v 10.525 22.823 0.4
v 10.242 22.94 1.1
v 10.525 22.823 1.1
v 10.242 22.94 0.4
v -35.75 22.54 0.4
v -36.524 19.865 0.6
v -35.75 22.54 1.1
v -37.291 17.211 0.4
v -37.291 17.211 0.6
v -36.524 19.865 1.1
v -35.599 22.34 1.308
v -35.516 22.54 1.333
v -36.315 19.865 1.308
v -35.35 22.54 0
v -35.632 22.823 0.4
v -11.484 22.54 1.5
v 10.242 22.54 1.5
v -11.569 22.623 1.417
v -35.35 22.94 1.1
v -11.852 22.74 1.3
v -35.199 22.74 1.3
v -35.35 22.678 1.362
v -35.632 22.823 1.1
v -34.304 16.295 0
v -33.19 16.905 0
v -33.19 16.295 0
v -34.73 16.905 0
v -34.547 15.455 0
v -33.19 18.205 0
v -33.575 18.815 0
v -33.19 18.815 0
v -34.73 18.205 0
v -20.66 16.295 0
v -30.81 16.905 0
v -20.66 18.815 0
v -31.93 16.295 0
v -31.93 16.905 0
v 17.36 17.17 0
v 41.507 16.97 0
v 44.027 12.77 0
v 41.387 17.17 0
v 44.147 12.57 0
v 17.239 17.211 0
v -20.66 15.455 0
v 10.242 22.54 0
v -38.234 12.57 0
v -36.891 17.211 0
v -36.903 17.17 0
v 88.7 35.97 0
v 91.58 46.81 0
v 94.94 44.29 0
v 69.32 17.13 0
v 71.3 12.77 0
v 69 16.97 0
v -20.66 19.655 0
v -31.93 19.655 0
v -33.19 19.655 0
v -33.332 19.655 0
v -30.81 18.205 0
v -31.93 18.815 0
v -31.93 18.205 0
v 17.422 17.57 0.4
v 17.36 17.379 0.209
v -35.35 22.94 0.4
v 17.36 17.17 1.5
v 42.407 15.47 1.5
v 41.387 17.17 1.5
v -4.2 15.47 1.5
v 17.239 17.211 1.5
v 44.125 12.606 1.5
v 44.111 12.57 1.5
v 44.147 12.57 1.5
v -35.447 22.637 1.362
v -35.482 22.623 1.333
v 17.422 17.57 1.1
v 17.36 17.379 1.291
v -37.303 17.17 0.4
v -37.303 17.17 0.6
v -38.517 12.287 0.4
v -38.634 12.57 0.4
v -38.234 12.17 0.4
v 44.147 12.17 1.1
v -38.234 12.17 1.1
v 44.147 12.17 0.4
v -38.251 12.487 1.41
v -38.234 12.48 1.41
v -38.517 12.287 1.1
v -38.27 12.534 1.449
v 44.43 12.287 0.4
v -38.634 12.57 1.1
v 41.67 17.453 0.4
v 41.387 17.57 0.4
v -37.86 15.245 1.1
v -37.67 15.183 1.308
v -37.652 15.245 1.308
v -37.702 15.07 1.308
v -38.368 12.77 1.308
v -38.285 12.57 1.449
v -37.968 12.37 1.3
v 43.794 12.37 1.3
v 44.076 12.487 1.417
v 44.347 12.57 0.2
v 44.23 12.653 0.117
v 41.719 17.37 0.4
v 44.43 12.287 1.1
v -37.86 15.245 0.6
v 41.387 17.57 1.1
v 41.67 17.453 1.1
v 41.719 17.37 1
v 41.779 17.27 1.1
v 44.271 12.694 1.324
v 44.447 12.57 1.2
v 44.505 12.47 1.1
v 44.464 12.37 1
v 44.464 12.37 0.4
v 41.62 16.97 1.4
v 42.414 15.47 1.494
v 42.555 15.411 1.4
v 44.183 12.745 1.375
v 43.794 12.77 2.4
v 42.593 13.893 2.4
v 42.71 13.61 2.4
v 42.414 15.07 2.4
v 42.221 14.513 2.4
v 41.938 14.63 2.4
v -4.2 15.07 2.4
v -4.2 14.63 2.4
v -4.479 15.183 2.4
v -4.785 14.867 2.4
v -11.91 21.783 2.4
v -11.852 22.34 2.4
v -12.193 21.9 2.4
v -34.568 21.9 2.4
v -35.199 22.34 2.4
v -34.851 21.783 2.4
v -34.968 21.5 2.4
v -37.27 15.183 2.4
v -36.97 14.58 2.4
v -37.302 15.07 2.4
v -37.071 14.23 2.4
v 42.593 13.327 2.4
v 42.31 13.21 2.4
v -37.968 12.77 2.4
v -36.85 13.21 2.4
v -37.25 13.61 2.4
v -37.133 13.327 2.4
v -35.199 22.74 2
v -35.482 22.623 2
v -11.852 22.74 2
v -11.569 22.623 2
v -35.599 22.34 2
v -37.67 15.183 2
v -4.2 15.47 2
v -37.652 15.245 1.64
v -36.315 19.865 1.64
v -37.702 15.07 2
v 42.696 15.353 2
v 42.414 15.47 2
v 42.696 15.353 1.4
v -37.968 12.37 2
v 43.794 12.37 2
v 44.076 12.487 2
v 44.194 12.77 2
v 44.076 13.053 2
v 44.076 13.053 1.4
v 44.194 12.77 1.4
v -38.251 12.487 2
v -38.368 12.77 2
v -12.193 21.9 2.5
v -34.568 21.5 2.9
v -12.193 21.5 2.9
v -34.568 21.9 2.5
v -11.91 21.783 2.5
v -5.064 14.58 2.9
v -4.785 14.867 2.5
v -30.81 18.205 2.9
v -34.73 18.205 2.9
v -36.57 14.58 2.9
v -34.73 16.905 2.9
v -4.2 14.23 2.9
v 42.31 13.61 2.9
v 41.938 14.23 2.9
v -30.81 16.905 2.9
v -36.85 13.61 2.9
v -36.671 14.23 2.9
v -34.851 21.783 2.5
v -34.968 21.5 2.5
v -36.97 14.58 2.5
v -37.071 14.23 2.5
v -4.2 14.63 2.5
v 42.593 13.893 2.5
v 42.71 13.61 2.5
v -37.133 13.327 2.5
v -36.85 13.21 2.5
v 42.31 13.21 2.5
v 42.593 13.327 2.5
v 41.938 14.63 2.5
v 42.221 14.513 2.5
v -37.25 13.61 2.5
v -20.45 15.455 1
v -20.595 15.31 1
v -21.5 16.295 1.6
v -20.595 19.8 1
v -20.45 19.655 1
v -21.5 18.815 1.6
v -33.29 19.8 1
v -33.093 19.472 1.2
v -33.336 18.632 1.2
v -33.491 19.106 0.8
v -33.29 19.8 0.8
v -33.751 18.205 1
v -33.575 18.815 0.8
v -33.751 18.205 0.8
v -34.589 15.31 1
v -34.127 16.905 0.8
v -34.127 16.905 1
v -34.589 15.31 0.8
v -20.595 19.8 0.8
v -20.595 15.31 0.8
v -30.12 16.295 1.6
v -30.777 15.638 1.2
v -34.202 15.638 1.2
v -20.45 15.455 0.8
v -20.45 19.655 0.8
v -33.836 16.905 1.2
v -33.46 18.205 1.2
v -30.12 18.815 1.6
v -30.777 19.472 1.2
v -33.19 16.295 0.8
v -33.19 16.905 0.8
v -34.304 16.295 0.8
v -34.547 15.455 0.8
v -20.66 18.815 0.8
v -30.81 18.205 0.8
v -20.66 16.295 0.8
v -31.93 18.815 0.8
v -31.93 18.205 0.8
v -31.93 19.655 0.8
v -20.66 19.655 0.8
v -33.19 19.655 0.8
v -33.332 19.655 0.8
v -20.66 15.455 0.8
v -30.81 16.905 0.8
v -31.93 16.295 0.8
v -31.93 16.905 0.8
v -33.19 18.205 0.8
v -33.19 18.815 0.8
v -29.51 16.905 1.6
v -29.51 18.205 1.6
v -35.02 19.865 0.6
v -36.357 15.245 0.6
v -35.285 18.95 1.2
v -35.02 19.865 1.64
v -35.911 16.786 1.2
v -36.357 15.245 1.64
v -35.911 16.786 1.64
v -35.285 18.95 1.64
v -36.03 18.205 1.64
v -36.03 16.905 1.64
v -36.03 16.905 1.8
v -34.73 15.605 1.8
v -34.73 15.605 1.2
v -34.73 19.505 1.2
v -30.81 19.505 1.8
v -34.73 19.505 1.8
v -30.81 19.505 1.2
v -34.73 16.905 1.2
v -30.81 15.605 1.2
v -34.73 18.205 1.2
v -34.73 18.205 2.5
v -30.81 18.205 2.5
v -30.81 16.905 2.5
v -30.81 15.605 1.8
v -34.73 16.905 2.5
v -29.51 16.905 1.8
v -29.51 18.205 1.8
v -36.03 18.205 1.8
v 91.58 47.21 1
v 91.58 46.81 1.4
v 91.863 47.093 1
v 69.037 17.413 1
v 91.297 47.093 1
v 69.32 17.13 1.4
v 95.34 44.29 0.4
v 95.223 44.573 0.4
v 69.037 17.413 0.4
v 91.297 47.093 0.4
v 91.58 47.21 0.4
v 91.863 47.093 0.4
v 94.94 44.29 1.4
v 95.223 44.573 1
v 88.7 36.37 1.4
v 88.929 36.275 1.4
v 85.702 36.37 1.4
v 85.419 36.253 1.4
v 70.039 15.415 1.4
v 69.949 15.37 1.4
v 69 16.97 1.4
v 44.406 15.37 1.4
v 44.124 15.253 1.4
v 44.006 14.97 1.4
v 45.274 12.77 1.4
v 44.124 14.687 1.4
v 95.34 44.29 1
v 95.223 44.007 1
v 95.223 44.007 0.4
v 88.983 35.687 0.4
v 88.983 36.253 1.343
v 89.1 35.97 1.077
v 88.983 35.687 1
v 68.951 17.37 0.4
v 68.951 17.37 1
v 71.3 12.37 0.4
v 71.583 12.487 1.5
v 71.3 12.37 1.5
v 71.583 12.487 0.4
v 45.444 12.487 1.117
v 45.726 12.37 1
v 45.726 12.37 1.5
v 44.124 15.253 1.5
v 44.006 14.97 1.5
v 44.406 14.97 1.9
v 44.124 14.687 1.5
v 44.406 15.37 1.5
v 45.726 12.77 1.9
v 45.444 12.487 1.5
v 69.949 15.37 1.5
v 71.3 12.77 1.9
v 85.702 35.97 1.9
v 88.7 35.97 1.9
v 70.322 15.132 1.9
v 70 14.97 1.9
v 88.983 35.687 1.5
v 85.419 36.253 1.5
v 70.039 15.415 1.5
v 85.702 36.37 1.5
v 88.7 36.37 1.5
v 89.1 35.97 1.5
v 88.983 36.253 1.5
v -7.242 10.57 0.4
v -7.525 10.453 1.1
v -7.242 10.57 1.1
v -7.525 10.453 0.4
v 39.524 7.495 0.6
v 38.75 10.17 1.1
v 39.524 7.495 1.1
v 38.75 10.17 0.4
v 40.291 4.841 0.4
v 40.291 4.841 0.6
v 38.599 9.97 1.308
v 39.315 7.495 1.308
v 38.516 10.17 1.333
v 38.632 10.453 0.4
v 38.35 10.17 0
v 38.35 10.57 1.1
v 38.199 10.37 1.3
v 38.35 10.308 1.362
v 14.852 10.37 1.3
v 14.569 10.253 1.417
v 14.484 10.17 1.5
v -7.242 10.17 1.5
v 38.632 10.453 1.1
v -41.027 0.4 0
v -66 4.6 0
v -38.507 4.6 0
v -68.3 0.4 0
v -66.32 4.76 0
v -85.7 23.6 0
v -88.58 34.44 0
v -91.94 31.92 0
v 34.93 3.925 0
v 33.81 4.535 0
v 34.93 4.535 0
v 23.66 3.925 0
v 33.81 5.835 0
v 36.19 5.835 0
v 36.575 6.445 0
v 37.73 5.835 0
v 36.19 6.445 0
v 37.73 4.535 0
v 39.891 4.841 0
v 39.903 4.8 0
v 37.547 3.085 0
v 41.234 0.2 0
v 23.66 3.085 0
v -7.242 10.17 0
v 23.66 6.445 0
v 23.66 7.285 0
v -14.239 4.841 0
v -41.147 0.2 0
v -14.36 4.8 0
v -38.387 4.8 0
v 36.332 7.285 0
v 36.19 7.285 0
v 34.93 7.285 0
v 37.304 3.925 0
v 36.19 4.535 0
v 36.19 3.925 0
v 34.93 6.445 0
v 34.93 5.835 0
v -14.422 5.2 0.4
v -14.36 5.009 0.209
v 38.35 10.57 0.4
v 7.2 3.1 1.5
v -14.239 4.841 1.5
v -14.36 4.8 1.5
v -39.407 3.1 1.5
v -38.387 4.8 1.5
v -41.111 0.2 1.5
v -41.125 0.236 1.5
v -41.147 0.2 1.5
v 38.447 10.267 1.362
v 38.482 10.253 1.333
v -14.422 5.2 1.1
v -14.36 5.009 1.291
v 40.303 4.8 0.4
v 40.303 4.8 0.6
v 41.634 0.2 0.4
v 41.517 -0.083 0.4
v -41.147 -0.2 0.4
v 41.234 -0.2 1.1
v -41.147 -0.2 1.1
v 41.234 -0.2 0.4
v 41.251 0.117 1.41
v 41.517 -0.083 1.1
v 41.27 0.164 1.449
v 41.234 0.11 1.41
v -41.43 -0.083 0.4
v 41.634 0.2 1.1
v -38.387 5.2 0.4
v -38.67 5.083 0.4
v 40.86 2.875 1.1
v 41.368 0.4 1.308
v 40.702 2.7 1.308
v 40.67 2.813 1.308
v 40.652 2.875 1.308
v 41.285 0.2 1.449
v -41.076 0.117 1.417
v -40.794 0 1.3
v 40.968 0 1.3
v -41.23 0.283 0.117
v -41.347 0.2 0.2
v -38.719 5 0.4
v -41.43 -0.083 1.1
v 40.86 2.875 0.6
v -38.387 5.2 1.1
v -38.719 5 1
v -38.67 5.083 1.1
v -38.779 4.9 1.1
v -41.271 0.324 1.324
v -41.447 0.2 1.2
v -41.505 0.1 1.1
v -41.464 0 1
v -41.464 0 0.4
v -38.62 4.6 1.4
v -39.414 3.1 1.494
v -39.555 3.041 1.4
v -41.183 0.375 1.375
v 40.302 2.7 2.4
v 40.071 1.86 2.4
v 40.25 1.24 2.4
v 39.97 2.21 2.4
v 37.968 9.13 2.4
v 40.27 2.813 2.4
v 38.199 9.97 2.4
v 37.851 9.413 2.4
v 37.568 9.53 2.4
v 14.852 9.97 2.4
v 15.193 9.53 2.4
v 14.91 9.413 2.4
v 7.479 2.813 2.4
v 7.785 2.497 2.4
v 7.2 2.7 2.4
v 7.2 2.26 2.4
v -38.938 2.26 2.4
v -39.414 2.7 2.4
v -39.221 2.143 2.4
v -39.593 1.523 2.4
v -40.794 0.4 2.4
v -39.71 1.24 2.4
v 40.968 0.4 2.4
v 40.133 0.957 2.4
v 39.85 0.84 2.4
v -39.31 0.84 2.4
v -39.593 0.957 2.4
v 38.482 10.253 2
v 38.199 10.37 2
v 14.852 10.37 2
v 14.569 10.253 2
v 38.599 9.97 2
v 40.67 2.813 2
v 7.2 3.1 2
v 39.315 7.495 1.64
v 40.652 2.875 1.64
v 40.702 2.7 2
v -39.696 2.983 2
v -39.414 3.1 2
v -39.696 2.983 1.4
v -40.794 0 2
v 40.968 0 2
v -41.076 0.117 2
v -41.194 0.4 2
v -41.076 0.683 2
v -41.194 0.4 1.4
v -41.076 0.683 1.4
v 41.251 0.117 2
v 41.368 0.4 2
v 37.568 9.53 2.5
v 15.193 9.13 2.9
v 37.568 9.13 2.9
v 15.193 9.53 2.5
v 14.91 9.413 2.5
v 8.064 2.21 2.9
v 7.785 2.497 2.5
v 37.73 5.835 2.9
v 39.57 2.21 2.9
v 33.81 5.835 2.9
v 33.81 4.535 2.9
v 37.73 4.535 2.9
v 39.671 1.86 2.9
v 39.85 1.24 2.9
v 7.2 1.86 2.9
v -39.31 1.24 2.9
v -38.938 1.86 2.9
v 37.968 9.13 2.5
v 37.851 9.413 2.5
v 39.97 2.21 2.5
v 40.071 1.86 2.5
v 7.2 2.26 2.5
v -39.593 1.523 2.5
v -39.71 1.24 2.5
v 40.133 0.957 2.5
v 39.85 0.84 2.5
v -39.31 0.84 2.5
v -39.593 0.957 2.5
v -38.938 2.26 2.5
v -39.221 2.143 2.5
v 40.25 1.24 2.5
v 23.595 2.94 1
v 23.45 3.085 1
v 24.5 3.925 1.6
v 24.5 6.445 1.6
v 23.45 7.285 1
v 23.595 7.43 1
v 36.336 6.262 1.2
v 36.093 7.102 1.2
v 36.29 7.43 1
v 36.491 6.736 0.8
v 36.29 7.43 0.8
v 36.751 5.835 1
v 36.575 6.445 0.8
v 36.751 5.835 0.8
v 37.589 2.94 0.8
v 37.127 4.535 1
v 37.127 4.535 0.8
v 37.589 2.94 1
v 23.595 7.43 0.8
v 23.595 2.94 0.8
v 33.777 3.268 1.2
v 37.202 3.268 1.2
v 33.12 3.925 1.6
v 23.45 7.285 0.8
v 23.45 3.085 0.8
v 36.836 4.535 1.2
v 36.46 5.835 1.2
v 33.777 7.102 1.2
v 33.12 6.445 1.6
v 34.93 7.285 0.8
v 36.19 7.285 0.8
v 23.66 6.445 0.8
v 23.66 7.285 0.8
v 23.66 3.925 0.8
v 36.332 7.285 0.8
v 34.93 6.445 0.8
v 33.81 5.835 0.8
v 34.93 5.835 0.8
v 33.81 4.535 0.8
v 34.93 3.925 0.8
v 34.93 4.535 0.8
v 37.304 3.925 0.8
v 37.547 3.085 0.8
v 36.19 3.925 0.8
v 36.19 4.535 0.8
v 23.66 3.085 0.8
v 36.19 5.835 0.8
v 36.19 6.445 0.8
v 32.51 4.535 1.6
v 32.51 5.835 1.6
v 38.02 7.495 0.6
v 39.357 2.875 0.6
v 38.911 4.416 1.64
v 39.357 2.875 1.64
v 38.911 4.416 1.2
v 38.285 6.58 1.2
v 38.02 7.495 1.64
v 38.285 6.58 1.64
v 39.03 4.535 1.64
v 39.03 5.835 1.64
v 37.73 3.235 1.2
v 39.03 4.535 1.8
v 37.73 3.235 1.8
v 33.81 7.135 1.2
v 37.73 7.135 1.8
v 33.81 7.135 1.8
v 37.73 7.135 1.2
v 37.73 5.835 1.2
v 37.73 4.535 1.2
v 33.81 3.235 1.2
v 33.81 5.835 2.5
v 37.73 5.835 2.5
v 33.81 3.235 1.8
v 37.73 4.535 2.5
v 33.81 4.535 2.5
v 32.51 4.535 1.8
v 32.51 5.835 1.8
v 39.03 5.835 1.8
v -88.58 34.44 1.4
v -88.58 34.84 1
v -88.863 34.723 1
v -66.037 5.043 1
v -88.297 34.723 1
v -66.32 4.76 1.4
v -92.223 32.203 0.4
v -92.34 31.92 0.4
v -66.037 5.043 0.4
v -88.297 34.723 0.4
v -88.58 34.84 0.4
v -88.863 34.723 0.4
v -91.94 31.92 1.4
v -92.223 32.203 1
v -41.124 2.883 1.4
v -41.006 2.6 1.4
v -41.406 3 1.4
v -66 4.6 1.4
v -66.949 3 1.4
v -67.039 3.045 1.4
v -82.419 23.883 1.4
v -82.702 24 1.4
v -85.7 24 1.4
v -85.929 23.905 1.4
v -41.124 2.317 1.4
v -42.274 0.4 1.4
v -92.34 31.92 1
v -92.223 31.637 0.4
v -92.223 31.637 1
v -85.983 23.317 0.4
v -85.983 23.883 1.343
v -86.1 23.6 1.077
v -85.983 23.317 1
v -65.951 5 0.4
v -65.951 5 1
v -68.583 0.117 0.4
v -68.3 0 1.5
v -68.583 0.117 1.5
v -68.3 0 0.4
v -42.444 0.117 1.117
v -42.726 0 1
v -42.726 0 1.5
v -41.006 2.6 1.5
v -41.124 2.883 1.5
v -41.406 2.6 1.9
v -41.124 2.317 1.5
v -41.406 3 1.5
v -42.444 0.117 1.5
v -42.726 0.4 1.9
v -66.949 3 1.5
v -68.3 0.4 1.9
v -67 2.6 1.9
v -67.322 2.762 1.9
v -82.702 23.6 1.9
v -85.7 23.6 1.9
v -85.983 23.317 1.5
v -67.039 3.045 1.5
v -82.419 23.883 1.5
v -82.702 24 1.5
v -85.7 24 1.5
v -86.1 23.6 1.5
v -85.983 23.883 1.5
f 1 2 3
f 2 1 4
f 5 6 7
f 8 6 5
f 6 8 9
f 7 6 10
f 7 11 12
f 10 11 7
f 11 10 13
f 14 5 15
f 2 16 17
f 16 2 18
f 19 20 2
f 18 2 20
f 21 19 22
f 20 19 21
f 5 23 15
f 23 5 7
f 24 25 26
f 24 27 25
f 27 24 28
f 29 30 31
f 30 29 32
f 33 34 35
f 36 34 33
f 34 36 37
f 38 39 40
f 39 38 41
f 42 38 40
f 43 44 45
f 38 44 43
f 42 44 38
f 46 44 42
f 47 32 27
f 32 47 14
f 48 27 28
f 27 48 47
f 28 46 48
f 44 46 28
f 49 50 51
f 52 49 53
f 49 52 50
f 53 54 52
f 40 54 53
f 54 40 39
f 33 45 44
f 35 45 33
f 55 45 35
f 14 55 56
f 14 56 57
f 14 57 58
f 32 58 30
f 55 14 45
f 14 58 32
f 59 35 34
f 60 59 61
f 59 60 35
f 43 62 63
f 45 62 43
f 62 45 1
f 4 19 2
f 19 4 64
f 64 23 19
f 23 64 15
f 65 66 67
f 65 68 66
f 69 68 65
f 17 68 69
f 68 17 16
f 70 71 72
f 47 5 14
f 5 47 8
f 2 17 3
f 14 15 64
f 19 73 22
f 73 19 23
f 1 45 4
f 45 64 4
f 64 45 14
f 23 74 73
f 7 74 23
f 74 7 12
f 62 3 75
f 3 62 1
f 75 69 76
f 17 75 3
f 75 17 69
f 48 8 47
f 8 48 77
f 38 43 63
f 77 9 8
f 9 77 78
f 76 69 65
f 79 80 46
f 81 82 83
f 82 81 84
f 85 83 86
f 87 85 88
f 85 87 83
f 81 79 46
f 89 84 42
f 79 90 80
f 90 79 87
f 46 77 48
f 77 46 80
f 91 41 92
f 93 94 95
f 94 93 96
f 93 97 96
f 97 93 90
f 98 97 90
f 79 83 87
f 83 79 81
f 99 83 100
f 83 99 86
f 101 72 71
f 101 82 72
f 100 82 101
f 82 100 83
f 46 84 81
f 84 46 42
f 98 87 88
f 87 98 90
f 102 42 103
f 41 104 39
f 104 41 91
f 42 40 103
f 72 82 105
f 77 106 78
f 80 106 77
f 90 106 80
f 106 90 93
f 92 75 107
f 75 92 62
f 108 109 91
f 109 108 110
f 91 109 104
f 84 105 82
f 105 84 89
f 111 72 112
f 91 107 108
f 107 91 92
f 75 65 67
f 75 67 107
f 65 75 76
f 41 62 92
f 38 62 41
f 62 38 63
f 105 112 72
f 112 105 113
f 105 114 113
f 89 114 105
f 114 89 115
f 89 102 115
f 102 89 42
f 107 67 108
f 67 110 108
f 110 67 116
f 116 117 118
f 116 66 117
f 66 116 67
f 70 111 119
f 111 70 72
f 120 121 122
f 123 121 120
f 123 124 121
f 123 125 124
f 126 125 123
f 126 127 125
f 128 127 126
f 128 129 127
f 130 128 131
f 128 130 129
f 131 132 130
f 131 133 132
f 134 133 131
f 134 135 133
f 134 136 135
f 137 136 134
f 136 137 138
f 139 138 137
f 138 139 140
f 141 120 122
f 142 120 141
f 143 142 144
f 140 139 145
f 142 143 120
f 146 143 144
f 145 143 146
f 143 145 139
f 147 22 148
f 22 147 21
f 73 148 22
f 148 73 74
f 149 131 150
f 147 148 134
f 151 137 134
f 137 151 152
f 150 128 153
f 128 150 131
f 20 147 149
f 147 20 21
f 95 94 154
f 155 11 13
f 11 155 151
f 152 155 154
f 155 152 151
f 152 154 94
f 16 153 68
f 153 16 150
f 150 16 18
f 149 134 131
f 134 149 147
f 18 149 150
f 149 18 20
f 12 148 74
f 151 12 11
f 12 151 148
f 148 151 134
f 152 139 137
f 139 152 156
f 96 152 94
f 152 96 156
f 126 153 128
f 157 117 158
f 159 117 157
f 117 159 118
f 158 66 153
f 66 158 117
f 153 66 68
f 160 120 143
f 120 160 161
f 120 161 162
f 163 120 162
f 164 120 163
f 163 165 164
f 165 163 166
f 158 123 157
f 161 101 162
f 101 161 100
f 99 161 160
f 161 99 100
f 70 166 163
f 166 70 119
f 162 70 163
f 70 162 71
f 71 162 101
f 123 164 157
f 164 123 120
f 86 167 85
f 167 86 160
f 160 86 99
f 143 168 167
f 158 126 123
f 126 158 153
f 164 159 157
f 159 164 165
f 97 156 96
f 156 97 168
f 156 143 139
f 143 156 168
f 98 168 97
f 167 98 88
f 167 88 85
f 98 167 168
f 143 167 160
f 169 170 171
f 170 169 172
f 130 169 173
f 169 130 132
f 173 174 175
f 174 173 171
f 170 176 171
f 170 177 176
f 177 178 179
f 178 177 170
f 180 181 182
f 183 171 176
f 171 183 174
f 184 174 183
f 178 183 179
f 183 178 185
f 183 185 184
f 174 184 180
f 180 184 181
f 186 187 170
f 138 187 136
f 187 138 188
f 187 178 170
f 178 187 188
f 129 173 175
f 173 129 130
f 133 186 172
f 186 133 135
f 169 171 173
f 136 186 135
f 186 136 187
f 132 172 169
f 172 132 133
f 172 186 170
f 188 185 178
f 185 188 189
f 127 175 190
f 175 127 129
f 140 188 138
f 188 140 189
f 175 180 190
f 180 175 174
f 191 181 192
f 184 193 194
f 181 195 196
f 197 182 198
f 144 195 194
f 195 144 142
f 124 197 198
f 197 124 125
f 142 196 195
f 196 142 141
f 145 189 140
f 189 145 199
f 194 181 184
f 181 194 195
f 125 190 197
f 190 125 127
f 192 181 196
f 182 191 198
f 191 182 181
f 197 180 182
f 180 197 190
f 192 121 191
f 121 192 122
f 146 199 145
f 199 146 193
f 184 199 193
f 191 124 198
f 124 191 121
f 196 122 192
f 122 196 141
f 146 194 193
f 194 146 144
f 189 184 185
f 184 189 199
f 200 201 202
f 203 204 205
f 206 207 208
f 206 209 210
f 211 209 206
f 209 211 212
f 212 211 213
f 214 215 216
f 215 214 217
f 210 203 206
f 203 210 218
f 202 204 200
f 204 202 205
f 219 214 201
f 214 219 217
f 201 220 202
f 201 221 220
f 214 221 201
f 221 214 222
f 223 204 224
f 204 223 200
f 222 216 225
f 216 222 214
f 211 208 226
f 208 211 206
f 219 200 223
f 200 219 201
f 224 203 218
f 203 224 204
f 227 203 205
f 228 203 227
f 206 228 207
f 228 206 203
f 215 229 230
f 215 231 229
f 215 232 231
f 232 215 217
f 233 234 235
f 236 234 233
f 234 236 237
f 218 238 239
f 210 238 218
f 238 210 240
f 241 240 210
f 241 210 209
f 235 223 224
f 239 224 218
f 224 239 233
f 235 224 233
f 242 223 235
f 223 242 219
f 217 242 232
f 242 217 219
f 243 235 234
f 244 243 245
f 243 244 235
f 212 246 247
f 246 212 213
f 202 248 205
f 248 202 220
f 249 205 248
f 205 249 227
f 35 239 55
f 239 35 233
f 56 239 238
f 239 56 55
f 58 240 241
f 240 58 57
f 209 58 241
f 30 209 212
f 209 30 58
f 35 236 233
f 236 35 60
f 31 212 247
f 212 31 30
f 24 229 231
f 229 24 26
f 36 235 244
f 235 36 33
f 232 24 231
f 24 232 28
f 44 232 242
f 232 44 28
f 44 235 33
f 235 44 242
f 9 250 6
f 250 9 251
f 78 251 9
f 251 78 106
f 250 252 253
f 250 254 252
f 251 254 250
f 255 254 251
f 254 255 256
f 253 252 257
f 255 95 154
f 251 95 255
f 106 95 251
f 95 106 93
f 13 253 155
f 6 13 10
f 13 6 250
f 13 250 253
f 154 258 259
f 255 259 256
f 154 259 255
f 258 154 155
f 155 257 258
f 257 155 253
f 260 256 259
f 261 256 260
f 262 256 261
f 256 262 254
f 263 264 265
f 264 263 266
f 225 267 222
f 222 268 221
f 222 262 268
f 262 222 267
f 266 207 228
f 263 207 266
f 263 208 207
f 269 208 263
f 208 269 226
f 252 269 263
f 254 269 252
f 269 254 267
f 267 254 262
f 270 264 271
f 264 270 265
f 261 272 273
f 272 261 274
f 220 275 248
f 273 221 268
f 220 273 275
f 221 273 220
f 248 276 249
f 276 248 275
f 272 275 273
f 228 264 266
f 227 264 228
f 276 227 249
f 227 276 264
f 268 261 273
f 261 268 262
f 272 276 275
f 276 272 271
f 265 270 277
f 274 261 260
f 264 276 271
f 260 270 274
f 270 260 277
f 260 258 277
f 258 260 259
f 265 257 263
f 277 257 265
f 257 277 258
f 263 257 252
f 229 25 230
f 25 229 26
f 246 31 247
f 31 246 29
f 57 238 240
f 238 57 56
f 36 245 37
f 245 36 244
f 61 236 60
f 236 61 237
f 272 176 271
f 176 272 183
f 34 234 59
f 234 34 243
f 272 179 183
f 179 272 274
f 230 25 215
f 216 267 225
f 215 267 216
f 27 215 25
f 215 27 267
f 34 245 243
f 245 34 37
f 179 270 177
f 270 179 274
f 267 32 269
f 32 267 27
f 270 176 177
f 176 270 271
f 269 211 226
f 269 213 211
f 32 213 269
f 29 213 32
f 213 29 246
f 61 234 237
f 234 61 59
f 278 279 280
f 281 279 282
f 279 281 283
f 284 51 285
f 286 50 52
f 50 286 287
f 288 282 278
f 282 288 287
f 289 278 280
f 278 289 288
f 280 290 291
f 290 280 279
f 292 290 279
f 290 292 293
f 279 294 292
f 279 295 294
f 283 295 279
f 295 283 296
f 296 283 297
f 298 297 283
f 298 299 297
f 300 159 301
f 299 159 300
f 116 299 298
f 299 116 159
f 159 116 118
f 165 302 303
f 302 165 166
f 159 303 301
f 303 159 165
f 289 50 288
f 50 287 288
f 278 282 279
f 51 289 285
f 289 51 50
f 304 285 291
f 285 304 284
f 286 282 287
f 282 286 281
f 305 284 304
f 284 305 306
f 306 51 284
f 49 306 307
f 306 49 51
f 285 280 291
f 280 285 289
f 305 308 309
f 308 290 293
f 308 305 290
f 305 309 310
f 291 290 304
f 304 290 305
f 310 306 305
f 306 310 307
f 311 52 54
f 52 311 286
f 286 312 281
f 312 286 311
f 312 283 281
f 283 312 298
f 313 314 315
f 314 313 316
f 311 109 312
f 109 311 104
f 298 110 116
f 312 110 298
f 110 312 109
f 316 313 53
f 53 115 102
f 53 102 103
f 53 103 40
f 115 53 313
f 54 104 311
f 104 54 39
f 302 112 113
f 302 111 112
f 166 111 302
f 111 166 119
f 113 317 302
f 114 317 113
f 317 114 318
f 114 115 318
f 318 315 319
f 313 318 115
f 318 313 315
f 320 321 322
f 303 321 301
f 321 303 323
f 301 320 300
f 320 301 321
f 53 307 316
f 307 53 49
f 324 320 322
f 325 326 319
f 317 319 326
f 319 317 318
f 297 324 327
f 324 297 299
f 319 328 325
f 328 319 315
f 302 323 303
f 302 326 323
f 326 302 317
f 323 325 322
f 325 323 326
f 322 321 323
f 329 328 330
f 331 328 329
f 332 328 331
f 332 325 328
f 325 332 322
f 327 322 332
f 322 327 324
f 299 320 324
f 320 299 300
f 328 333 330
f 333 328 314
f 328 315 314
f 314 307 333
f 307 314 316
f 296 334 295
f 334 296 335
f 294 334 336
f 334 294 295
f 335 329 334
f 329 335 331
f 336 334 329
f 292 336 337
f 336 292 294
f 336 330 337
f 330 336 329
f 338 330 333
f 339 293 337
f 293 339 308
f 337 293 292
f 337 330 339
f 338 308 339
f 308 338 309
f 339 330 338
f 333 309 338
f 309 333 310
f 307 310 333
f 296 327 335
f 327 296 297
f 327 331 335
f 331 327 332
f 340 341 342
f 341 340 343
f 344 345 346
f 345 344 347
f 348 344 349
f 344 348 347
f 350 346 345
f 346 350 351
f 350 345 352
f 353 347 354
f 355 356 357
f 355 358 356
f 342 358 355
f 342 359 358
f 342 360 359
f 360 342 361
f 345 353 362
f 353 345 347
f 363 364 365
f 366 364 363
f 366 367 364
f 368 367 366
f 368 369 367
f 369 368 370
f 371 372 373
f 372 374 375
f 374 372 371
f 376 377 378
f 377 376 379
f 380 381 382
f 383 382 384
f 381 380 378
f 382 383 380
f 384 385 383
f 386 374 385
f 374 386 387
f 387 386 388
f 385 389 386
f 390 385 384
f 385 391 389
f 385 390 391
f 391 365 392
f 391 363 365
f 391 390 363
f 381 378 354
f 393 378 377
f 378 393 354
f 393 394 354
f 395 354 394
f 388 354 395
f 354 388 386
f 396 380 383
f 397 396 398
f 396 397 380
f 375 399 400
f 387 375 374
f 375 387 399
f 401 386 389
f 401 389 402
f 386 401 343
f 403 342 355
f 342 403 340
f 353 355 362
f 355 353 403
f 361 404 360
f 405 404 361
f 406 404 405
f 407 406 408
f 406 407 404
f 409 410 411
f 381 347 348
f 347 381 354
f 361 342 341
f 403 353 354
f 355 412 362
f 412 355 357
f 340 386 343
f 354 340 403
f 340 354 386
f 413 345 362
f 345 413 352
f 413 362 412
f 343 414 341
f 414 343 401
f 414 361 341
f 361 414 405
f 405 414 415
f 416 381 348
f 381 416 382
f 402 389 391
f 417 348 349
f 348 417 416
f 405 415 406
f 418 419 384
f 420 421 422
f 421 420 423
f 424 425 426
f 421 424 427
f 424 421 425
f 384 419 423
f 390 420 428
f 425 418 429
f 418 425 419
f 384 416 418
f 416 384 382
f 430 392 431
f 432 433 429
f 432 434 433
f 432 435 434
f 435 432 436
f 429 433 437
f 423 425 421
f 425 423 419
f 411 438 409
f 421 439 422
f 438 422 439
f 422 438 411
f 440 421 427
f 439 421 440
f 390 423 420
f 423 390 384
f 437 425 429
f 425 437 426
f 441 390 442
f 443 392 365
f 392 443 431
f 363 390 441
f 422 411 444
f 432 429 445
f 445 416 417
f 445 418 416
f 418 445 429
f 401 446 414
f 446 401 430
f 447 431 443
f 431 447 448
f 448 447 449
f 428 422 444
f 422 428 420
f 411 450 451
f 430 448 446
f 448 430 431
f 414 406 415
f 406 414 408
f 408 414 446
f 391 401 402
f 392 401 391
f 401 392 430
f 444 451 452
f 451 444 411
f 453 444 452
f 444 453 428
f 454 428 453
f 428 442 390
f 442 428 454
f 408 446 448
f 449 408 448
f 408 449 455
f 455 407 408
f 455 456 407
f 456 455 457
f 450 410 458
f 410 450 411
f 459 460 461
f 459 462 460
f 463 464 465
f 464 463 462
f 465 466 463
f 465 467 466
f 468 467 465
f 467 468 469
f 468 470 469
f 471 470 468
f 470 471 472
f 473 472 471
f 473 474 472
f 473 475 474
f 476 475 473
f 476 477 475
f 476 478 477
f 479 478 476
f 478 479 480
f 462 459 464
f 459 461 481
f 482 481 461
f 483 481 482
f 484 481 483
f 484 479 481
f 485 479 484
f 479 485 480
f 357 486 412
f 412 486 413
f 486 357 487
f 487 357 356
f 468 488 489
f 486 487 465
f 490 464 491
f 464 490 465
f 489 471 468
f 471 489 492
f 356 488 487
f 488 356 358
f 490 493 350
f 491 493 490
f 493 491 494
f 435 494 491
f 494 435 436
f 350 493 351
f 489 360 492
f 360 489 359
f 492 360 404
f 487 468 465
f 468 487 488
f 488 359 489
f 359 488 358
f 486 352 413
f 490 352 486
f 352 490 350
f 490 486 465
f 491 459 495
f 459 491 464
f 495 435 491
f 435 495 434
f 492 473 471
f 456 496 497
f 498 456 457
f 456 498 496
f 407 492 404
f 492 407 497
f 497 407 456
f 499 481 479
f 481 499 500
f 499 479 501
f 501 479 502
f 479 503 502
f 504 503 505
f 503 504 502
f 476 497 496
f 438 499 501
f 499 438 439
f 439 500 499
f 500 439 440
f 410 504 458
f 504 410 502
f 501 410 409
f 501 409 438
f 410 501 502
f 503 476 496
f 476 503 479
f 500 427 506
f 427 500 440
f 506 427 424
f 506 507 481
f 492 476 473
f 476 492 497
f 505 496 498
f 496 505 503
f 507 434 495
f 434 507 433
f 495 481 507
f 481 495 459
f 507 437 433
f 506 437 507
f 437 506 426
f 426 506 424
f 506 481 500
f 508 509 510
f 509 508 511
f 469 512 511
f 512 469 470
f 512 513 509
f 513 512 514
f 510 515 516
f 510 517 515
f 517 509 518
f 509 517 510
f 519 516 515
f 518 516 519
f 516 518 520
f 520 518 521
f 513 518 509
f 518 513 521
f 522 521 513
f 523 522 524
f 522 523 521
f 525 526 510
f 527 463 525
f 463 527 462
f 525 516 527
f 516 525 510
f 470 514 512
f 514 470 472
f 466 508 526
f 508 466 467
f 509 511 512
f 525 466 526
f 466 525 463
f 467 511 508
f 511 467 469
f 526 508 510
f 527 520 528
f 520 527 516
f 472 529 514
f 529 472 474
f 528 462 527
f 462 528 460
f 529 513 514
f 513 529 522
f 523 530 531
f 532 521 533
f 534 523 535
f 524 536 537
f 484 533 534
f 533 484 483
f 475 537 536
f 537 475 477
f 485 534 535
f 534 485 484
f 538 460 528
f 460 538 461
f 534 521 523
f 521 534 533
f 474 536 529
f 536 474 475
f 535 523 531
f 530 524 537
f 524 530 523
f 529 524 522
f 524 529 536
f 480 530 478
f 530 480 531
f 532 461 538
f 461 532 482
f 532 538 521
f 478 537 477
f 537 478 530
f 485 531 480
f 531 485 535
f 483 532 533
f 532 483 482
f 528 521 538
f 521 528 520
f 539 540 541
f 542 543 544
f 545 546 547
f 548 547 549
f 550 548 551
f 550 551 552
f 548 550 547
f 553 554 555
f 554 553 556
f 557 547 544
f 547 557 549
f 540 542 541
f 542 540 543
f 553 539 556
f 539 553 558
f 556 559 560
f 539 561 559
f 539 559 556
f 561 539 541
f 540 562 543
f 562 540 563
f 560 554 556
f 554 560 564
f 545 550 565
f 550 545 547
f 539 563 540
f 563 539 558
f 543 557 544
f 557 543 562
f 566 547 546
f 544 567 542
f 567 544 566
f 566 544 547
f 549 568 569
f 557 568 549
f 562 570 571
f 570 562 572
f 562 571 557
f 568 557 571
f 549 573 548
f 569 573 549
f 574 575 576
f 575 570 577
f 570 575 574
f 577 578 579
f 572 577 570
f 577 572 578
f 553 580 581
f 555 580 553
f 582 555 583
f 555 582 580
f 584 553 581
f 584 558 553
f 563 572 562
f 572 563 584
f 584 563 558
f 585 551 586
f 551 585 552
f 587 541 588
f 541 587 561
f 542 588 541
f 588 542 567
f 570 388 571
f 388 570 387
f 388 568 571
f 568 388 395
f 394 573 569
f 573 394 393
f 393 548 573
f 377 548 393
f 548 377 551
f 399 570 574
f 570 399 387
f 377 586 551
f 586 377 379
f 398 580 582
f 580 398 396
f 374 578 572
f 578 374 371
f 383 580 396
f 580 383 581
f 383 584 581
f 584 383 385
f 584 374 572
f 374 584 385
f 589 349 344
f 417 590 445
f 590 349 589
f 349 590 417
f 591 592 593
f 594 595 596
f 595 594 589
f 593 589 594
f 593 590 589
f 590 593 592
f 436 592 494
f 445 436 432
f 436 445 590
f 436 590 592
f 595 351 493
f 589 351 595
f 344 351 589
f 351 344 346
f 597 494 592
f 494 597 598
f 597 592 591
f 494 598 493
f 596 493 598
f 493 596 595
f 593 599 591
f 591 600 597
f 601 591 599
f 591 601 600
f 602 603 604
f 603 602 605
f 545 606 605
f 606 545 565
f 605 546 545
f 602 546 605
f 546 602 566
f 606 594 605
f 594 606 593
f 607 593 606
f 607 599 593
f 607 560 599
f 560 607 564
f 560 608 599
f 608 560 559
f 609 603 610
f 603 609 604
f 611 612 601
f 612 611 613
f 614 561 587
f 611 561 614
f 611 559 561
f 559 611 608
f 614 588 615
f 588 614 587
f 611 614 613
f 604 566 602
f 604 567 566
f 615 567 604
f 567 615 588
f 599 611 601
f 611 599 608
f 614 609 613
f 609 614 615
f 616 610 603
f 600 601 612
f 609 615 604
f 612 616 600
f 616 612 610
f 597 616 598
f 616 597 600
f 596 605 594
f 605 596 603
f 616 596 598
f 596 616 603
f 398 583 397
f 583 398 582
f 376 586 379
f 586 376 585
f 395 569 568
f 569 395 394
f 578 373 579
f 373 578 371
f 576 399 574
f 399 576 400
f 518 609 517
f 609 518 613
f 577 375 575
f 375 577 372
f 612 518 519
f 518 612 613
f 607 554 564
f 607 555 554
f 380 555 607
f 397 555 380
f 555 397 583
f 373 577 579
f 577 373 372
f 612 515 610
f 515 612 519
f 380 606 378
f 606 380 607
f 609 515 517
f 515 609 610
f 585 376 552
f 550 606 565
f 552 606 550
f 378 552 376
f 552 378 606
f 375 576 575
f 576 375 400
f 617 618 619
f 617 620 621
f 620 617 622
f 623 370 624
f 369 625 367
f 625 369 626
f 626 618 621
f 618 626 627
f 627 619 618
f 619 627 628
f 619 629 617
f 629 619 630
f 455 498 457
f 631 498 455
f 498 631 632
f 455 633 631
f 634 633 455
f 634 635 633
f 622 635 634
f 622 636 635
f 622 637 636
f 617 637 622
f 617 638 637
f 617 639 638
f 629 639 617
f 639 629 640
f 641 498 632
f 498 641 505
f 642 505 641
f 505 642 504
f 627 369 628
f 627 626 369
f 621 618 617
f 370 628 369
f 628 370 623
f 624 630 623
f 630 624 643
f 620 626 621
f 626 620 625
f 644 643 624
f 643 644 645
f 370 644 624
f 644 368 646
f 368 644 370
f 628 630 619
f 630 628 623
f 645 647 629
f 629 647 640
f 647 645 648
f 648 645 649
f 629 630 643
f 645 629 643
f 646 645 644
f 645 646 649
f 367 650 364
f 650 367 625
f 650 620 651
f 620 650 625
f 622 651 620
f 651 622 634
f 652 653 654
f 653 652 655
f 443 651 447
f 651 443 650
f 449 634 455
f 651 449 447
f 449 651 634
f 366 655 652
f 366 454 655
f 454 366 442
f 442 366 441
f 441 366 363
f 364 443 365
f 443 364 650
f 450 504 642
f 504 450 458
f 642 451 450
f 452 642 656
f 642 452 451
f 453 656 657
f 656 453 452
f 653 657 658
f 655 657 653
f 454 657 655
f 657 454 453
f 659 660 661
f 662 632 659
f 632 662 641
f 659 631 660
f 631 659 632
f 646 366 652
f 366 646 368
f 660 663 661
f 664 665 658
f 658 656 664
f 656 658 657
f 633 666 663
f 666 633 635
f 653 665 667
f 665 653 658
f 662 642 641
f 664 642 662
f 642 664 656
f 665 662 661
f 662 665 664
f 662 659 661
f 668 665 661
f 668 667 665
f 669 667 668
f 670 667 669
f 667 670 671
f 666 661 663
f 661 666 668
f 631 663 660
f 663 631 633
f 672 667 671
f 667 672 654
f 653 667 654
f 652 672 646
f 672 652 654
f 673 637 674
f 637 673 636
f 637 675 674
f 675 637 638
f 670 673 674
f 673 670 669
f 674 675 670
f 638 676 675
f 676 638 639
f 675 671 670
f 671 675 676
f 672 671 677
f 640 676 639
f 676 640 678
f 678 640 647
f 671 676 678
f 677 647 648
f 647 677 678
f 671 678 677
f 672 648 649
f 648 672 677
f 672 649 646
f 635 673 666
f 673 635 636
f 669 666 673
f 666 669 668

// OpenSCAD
// Replace arms for glasses
// Make: MOREL
// Model: LIGHTEC 6810L
// Parameters: 52[]17  140 GB 205

render_part="glasses_arm_mount_slot_cutout";
//render_part="glasses_arm";
//render_part="glasses_ear";
render_part="glasses_arm_pair";

min_space=2.0;
layer_th=0.2;
nozzle_d=0.4;
grow_hole_abs=nozzle_d/2;

function quicksort_x(arr) = !(len(arr)>0 && len(arr[0])>1) ? [] : let(
    pivot   = arr[floor(len(arr)/2)][0],
    lesser  = [ for (vec = arr) if (vec[0]  < pivot) vec ],
    equal   = [ for (vec = arr) if (vec[0] == pivot) vec ],
    greater = [ for (vec = arr) if (vec[0]  > pivot) vec ]
        ) concat(
            quicksort_x(lesser), equal, quicksort_x(greater)
    );

function quicksort_y(arr) = !(len(arr)>0 && len(arr[0])>1) ? [] : let(
    pivot   = arr[floor(len(arr)/2)][1],
    lesser  = [ for (vec = arr) if (vec[1]  < pivot) vec ],
    equal   = [ for (vec = arr) if (vec[1] == pivot) vec ],
    greater = [ for (vec = arr) if (vec[1]  > pivot) vec ]
        ) concat(
            quicksort_y(lesser), equal, quicksort_y(greater)
    );

glasses_arm_outline_start_pt=[0,0];
glasses_arm_outline_end_pt=[3.0,10.37];
glasses_arm_outline=[glasses_arm_outline_start_pt
    ,[83.0,0],[80.0,5.0]
    ,[55.86,5.0],[48.81,10.37]
    ,glasses_arm_outline_end_pt];
echo(str("quicksort_x(quicksort_y(glasses_arm_outline)) = ",quicksort_x(quicksort_y(glasses_arm_outline))));
echo(str("quicksort_y(quicksort_x(glasses_arm_outline)) = ",quicksort_y(quicksort_x(glasses_arm_outline))));
glasses_arm_outline_bbox=[
    [ quicksort_x(glasses_arm_outline)[0][0]
        , quicksort_y(glasses_arm_outline)[0][1] ]
    ,[ quicksort_x(glasses_arm_outline)[len(glasses_arm_outline)-1][0]
        , quicksort_y(glasses_arm_outline)[len(glasses_arm_outline)-1][1] ]
    ];
echo(str("glasses_arm_outline_bbox = ",glasses_arm_outline_bbox));
glasses_arm_inline=[glasses_arm_outline_start_pt
    ,[83.0,0],[83.0-(3.1*(83.0-80.0)/5.00),3.1]
    ,[34.30,3.1],[26.81,10.37]
    ,glasses_arm_outline_end_pt];
glasses_arm_inline_bbox=[
    [ quicksort_x(glasses_arm_inline)[0][0]
        , quicksort_y(glasses_arm_inline)[0][1] ]
    ,[ quicksort_x(glasses_arm_inline)[len(glasses_arm_inline)-1][0]
        , quicksort_y(glasses_arm_inline)[len(glasses_arm_inline)-1][1] ]
    ];
echo(str("glasses_arm_inline_bbox = ",glasses_arm_inline_bbox));
glasses_arm_mount_hole_w=0.9+2*grow_hole_abs;
glasses_arm_mount_hole_l=3.82+0.5*grow_hole_abs;
glasses_arm_mount_hole_offset=(glasses_arm_outline_end_pt-glasses_arm_outline_start_pt)/2+[2.27,0];
glasses_arm_mount_hole=[
    glasses_arm_mount_hole_offset+[0,-glasses_arm_mount_hole_w/2]
    ,glasses_arm_mount_hole_offset+[0,glasses_arm_mount_hole_w/2]
    ,glasses_arm_mount_hole_offset+[glasses_arm_mount_hole_l,glasses_arm_mount_hole_w/2]
    ,glasses_arm_mount_hole_offset+[glasses_arm_mount_hole_l,-glasses_arm_mount_hole_w/2]
];
glasses_arm_mount_slot_th=0.84;
//glasses_arm_mount_slot_w=4.82;
glasses_arm_mount_slot_w=4.0+grow_hole_abs;
glasses_arm_mount_slot_l=13.64+5*glasses_arm_mount_slot_th;
// glasses_arm_mount_slot_l=20;
glasses_arm_mount_slot_dy=[0,1]*glasses_arm_mount_hole_offset;
glasses_arm_mount_slot=[
    [0,glasses_arm_mount_slot_dy-glasses_arm_mount_slot_w/2]
    ,[glasses_arm_mount_slot_l,glasses_arm_mount_slot_dy-glasses_arm_mount_slot_w/2]
//    ,[glasses_arm_mount_hole_offset[0]+glasses_arm_mount_hole_l/2,glasses_arm_mount_slot_dy-glasses_arm_mount_slot_w/2]
    ,[glasses_arm_mount_slot_l,glasses_arm_mount_slot_dy+glasses_arm_mount_slot_w/2]
//    ,[glasses_arm_mount_hole_offset[0]+glasses_arm_mount_hole_l/2,glasses_arm_mount_slot_dy+glasses_arm_mount_slot_w/2]
    ,[0,glasses_arm_mount_slot_dy+glasses_arm_mount_slot_w/2]
];
glasses_arm_mount_slot_h=5.67-0.7-1.45-glasses_arm_mount_slot_th/2-1*layer_th;
echo(str("glasses_arm_mount_slot_h = ",glasses_arm_mount_slot_h));

glasses_arm_outline_th=2.10-3*layer_th;
glasses_arm_inline_th=2.60-1*layer_th;
glasses_arm_inner_th=1.60-layer_th;

glasses_ear_outline_extend=[3.0,0];
glasses_ear_outline_start_pt=[83.0,0];
glasses_ear_outline_outer_elbow_pt=[134.0-32*3/4,0];
glasses_ear_outline_inner_elbow_pt=[130-30.0*3/4,5.0];
glasses_ear_outline_end_pt=[80.0,5.0];
glasses_ear_outline=[glasses_ear_outline_start_pt-glasses_ear_outline_extend
    ,glasses_ear_outline_outer_elbow_pt
    ,[134.0,32.0],[130,35.0]
    ,glasses_ear_outline_inner_elbow_pt
    ,glasses_ear_outline_end_pt-glasses_ear_outline_extend];
glasses_ear_outline_bbox=[
    [ quicksort_x(glasses_ear_outline)[0][0]
        , quicksort_y(glasses_ear_outline)[0][1] ]
    ,[ quicksort_x(glasses_ear_outline)[len(glasses_ear_outline)-1][0]
        , quicksort_y(glasses_ear_outline)[len(glasses_ear_outline)-1][1] ]
    ];
echo(str("glasses_ear_outline_bbox = ",glasses_ear_outline_bbox));
glasses_ear_inline_inset=[1.0,0];
glasses_ear_inline=[[83.0,0]+glasses_ear_inline_inset
    ,glasses_ear_outline_outer_elbow_pt
    ,[134.0-(32-24)*3/4,24.0],[130-(32-24)*3/4,24.0]
//    ,[130-24.0*3/4-5*3/4,3.0]
    ,glasses_ear_outline_outer_elbow_pt-(glasses_ear_outline_outer_elbow_pt-glasses_ear_outline_inner_elbow_pt)*3/5
//    ,[83.0-3*3/5,3.0]
    ,glasses_ear_outline_start_pt-(glasses_ear_outline_start_pt-glasses_ear_outline_end_pt)*3/5+glasses_ear_inline_inset
    ];
glasses_ear_inline_bbox=[
    [ quicksort_x(glasses_ear_inline)[0][0]
        , quicksort_y(glasses_ear_inline)[0][1] ]
    ,[ quicksort_x(glasses_ear_inline)[len(glasses_ear_inline)-1][0]
        , quicksort_y(glasses_ear_inline)[len(glasses_ear_inline)-1][1] ]
    ];
echo(str("glasses_ear_inline_bbox = ",glasses_ear_inline_bbox));
glasses_ear_outline_th=2.00-3*layer_th;
glasses_ear_inline_th=2.50-3*layer_th;

module glasses_arm_mount_slot_cutout() {
    // top of tongue
    hull() {
        translate([0,0,4*layer_th])
            linear_extrude(layer_th) intersection() {
                offset(glasses_arm_mount_slot_th/4) polygon(glasses_arm_mount_slot,convexity=10);
                offset(-3.5*glasses_arm_mount_slot_th) polygon(glasses_arm_outline,convexity=10);
            }
        translate([0,0,glasses_arm_inline_th/2]) linear_extrude(glasses_arm_inline_th/4-layer_th,center=false) offset(-glasses_arm_mount_slot_th) intersection() {
            polygon(glasses_arm_mount_slot,convexity=10);
            offset(-3.5*glasses_arm_mount_slot_th) polygon(glasses_arm_outline,convexity=10);
        }
    }
    // sides of tongue
    translate([0,0,-layer_th]) linear_extrude(4*layer_th+layer_th,center=false) intersection() {
        difference() {
            polygon(glasses_arm_mount_slot,convexity=10);
            translate([glasses_arm_mount_slot_th,0]) offset(-glasses_arm_mount_slot_th) polygon(glasses_arm_mount_slot,convexity=10);
        }
        offset(-3.5*glasses_arm_mount_slot_th) polygon(glasses_arm_outline,convexity=10);
    }
    // end slot
    translate([0,0,3*layer_th]) linear_extrude(glasses_arm_mount_slot_th+layer_th) intersection() {
        offset(glasses_arm_mount_slot_th/4) polygon(glasses_arm_mount_slot,convexity=10);
        difference() {
            offset(grow_hole_abs) polygon(glasses_arm_outline,convexity=10);
            offset(-1.5*glasses_arm_mount_slot_th) polygon(glasses_arm_outline,convexity=10);
        }
    }
    // upper cavity
    hull() {
        translate([0,0,glasses_arm_mount_slot_h-glasses_arm_inline_th/2]) linear_extrude(glasses_arm_inline_th/2-2*layer_th,center=false) polygon(glasses_arm_mount_hole,convexity=10);
        translate([0,0,glasses_arm_inline_th/2]) linear_extrude(glasses_arm_inline_th/4,center=false) offset(glasses_arm_mount_hole_w) polygon(glasses_arm_mount_hole,convexity=10);
    }
    translate(glasses_arm_mount_hole_offset+[glasses_arm_mount_hole_l/2-0.5*glasses_arm_mount_slot_th,-glasses_arm_mount_slot_w/2]) 
        translate([0,0,-layer_th]) {
            linear_extrude(layer_th+4*layer_th) square([1.5*glasses_arm_mount_slot_th,glasses_arm_mount_slot_w],center=false);
    }
}

if(render_part=="glasses_arm_mount_slot_cutout") {
    echo("Rendering glasses_arm_mount_slot_cutout()");
    glasses_arm_mount_slot_cutout();
}

module glasses_arm() {
    difference() {
        difference() {
            union() {
                render() minkowski() {
                    linear_extrude(glasses_arm_outline_th-0*glasses_arm_mount_slot_th-4*layer_th) 
                        offset(-layer_th) polygon(glasses_arm_outline,convexity=10);
                    hull() {
                        cylinder(r1=0,r2=2*layer_th,h=2*layer_th,center=false,$fn=8);
                        translate([0,0,2*layer_th]) cylinder(r1=2*layer_th,r2=0,h=2*layer_th,center=false,$fn=8);
                    }
                }
                render() minkowski() {
                    linear_extrude(glasses_arm_inline_th-4*layer_th) offset(-2*layer_th) polygon(glasses_arm_inline,convexity=10);
                    hull() {
                        cylinder(r1=0,r2=2*layer_th,h=2*layer_th,center=false,$fn=8);
                        translate([0,0,2*layer_th]) cylinder(r1=2*layer_th,r2=0,h=2*layer_th,center=false,$fn=8);
                    }
                }
                render() minkowski() {
                    linear_extrude(glasses_arm_mount_slot_h-2*layer_th) offset(-glasses_arm_mount_slot_th-2*layer_th) polygon(glasses_arm_inline,convexity=10);
                    cylinder(r1=2*layer_th,r2=0,h=2*layer_th,center=false,$fn=8);
                }
            }
            glasses_arm_mount_slot_cutout();
            
        }
        linear_extrude(4*glasses_arm_inline_th,center=true) polygon(glasses_arm_mount_hole,convexity=10);
    }
}

module glasses_arm_inset() {
    translate([0,0,glasses_arm_mount_slot_h-2*layer_th]) linear_extrude(3*layer_th)
        offset(-glasses_arm_mount_slot_th-2*layer_th-2*nozzle_d) polygon(glasses_arm_inline,convexity=10);
}

if(render_part=="glasses_arm") {
    echo("Rendering glasses_arm()");
    difference() {
        glasses_arm();
        #glasses_arm_inset();
    }
}

module glasses_ear() {
    render() minkowski() {
        linear_extrude(glasses_ear_outline_th-4*layer_th) offset(-2*layer_th) polygon(glasses_ear_outline,convexity=10);
        hull() {
            cylinder(r1=0,r2=2*layer_th,h=2*layer_th,center=false,$fn=8);
            translate([0,0,2*layer_th]) cylinder(r1=2*layer_th,r2=0,h=2*layer_th,center=false,$fn=8);
        }
    }
    render() minkowski() {
        linear_extrude(glasses_ear_inline_th-4*layer_th) offset(-2*layer_th) polygon(glasses_ear_inline,convexity=10);
        hull() {
            cylinder(r1=0,r2=2*layer_th,h=2*layer_th,center=false,$fn=8);
            translate([0,0,2*layer_th]) cylinder(r1=2*layer_th,r2=0,h=2*layer_th,center=false,$fn=8);
        }
    }
}

if(render_part=="glasses_ear") {
    echo("Rendering glasses_ear()");
    glasses_ear();
}

module glasses_arm_pair() {
    color([0,0.8,0]) translate(glasses_arm_outline_end_pt+[-glasses_arm_outline_bbox[1][0]/2,min_space]) union() {
        glasses_arm();
        glasses_ear();
    }
    color([0.8,0,0]) translate([glasses_arm_outline_bbox[1][0]/2,0]) mirror([1,0,0]) {
        union() {
            glasses_arm();
            glasses_ear();
        }
    }
}

if(render_part=="glasses_arm_pair") {
    echo("Rendering glasses_arm_pair()");
    glasses_arm_pair();
}
